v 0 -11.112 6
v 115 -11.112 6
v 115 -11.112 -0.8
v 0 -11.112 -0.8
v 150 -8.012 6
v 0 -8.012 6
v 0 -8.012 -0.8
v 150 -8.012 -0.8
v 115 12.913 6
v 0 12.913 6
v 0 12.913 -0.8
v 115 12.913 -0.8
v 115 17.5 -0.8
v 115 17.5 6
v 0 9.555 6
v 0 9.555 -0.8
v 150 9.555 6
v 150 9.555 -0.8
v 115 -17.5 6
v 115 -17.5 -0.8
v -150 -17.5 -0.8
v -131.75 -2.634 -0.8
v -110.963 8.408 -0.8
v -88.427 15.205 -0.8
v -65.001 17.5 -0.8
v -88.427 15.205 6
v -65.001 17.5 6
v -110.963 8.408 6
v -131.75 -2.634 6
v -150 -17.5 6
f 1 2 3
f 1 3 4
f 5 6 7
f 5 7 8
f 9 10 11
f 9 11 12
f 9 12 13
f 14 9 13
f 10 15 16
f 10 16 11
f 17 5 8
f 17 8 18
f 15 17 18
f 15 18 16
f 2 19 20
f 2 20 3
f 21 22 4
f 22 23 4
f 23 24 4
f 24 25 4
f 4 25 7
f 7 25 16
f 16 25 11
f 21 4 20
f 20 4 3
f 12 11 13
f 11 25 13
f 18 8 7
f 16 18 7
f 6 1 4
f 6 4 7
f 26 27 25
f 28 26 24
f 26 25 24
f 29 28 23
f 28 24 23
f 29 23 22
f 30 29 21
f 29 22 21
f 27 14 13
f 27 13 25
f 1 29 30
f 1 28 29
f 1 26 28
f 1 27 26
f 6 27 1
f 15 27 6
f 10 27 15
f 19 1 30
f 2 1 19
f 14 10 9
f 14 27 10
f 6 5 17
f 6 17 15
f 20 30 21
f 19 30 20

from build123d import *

# Parameters (mm, degrees)
F1_DEPTH    = 6
F2_DEPTH    = 0.8
F3_T1_DEPTH = 431.7925725323
F4_DEPTH    = 35


# Not quite as in the source:
# - a fillet or chamfer that OpenCascade refuses, or shapes differently, is made with other operations: its cross-section is extruded or revolved along the edge and cut away or added


with BuildPart() as f1:
    # F0 (on Top) → F1 (new body)
    with BuildSketch(Plane.XY):
        Polygon((150, 17.5), (-150, 17.5), (-150, -17.5), (150, -17.5), (150, -11.1123658717), (0, -11.1123658717), (0, -8.0123320222), (150, -8.0123320222), (150, 9.5545258373), (0, 9.5545258373), (0, 12.9128964618), (150, 12.9128964618), align=None)
    extrude(amount=F1_DEPTH)

    # F2 (add): faces of the model
    f2_faces = [f1.faces().sort_by_distance(p)[0] for p in [
        (-7.6230433236, -0.1272136786, 0),
        (-7.6230433236, -0.1272136786, 6),
    ]]
    extrude(f2_faces, amount=F2_DEPTH, dir=(0, 0, -1))

    # F3: fillet of radius 120.7106781187 on 1 edges, made by hand

    # F3_s2 → F3_t1 (cut)
    with BuildSketch(Plane.XY.offset(-213.2962862662)):
        with BuildLine():
            ThreePointArc((-65.0014854935, 17.5), (-110.9627394699, 8.4075593911), (-150, -17.5))
            Line((-150, -17.5), (-150, 17.5))
            Line((-150, 17.5), (-65.0014854935, 17.5))
        make_face()
    extrude(amount=F3_T1_DEPTH, mode=Mode.SUBTRACT)

    # F4 (cut): faces of the model
    f4_faces = [f1.faces().sort_by_distance(p)[0] for p in [
        (150, 15.2064482309, 2.6),
        (150, -14.3061829358, 2.6),
    ]]
    extrude(f4_faces, amount=-F4_DEPTH, mode=Mode.SUBTRACT)


solid = f1.part
